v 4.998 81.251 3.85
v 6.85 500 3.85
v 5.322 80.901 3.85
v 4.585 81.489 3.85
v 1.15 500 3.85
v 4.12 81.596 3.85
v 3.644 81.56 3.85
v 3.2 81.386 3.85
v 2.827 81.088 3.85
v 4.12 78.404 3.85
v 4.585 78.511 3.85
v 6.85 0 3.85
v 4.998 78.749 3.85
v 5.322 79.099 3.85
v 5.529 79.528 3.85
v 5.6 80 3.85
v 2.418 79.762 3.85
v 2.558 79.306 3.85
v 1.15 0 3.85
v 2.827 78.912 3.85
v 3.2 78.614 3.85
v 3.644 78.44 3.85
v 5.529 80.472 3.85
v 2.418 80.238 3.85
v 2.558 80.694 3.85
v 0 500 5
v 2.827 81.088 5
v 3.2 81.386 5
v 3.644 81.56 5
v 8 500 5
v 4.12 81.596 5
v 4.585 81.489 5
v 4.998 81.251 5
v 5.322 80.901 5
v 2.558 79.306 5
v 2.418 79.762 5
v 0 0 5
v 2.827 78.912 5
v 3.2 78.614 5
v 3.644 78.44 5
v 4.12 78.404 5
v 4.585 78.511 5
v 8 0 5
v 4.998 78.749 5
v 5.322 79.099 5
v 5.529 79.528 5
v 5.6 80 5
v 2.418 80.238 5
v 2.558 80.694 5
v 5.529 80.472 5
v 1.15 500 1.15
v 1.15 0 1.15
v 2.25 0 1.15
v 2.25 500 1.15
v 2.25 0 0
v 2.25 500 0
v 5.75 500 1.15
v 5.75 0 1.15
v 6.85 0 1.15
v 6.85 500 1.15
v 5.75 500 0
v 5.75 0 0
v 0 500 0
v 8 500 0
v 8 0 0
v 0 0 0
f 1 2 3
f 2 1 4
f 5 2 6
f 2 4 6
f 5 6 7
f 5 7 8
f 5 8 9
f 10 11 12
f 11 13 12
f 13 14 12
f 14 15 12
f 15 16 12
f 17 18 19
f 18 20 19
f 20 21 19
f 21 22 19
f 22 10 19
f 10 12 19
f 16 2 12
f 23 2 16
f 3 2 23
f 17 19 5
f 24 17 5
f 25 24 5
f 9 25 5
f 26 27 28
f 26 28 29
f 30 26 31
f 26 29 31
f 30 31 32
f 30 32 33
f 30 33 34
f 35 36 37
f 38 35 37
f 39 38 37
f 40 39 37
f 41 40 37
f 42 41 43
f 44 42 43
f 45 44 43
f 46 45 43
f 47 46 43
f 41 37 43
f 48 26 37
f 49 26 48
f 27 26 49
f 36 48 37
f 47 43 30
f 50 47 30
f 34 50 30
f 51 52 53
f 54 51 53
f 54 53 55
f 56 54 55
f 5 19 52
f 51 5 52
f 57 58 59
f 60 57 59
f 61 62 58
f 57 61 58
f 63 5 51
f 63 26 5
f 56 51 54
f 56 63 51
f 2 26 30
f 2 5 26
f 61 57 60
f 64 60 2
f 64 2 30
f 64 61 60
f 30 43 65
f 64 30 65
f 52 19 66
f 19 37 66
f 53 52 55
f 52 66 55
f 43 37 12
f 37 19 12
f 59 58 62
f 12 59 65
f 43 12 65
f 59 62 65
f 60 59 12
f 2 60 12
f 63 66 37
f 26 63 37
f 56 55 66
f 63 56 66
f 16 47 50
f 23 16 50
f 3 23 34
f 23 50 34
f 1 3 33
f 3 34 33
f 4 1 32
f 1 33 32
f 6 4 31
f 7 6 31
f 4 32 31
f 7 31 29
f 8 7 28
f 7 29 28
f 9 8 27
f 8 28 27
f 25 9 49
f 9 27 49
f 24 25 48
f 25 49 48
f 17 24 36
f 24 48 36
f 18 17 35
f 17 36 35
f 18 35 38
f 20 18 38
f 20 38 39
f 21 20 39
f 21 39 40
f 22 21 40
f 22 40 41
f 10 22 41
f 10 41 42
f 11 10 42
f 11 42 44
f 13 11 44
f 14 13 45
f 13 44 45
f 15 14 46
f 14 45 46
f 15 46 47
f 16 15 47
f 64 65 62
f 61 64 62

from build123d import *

# Parameters (mm, degrees)
EXTRUDE_1_DEPTH     = 500
SKETCH_2_R          = 1.6
CUT_EXTRUDE_1_DEPTH = 1.15


with BuildPart() as part:
    # 草图1 → 凸台-拉伸1 (new body)
    with BuildSketch(Plane(origin=(0, 0, 0), x_dir=(1, 0, 0), z_dir=(0, 1, 0))):
        Polygon((0, -5), (8, -5), (8, 0), (5.75, 0), (5.75, -1.15), (6.85, -1.15), (6.85, -3.85), (1.15, -3.85), (1.15, -1.15), (2.25, -1.15), (2.25, 0), (0, 0), align=None)
    extrude(amount=EXTRUDE_1_DEPTH)

    # 草图2 → 切除-拉伸1 (cut)
    with BuildSketch(Plane.XY.offset(5)):
        with Locations((4, 80)):
            Circle(SKETCH_2_R)
    extrude(amount=-CUT_EXTRUDE_1_DEPTH, mode=Mode.SUBTRACT)


solid = part.part
